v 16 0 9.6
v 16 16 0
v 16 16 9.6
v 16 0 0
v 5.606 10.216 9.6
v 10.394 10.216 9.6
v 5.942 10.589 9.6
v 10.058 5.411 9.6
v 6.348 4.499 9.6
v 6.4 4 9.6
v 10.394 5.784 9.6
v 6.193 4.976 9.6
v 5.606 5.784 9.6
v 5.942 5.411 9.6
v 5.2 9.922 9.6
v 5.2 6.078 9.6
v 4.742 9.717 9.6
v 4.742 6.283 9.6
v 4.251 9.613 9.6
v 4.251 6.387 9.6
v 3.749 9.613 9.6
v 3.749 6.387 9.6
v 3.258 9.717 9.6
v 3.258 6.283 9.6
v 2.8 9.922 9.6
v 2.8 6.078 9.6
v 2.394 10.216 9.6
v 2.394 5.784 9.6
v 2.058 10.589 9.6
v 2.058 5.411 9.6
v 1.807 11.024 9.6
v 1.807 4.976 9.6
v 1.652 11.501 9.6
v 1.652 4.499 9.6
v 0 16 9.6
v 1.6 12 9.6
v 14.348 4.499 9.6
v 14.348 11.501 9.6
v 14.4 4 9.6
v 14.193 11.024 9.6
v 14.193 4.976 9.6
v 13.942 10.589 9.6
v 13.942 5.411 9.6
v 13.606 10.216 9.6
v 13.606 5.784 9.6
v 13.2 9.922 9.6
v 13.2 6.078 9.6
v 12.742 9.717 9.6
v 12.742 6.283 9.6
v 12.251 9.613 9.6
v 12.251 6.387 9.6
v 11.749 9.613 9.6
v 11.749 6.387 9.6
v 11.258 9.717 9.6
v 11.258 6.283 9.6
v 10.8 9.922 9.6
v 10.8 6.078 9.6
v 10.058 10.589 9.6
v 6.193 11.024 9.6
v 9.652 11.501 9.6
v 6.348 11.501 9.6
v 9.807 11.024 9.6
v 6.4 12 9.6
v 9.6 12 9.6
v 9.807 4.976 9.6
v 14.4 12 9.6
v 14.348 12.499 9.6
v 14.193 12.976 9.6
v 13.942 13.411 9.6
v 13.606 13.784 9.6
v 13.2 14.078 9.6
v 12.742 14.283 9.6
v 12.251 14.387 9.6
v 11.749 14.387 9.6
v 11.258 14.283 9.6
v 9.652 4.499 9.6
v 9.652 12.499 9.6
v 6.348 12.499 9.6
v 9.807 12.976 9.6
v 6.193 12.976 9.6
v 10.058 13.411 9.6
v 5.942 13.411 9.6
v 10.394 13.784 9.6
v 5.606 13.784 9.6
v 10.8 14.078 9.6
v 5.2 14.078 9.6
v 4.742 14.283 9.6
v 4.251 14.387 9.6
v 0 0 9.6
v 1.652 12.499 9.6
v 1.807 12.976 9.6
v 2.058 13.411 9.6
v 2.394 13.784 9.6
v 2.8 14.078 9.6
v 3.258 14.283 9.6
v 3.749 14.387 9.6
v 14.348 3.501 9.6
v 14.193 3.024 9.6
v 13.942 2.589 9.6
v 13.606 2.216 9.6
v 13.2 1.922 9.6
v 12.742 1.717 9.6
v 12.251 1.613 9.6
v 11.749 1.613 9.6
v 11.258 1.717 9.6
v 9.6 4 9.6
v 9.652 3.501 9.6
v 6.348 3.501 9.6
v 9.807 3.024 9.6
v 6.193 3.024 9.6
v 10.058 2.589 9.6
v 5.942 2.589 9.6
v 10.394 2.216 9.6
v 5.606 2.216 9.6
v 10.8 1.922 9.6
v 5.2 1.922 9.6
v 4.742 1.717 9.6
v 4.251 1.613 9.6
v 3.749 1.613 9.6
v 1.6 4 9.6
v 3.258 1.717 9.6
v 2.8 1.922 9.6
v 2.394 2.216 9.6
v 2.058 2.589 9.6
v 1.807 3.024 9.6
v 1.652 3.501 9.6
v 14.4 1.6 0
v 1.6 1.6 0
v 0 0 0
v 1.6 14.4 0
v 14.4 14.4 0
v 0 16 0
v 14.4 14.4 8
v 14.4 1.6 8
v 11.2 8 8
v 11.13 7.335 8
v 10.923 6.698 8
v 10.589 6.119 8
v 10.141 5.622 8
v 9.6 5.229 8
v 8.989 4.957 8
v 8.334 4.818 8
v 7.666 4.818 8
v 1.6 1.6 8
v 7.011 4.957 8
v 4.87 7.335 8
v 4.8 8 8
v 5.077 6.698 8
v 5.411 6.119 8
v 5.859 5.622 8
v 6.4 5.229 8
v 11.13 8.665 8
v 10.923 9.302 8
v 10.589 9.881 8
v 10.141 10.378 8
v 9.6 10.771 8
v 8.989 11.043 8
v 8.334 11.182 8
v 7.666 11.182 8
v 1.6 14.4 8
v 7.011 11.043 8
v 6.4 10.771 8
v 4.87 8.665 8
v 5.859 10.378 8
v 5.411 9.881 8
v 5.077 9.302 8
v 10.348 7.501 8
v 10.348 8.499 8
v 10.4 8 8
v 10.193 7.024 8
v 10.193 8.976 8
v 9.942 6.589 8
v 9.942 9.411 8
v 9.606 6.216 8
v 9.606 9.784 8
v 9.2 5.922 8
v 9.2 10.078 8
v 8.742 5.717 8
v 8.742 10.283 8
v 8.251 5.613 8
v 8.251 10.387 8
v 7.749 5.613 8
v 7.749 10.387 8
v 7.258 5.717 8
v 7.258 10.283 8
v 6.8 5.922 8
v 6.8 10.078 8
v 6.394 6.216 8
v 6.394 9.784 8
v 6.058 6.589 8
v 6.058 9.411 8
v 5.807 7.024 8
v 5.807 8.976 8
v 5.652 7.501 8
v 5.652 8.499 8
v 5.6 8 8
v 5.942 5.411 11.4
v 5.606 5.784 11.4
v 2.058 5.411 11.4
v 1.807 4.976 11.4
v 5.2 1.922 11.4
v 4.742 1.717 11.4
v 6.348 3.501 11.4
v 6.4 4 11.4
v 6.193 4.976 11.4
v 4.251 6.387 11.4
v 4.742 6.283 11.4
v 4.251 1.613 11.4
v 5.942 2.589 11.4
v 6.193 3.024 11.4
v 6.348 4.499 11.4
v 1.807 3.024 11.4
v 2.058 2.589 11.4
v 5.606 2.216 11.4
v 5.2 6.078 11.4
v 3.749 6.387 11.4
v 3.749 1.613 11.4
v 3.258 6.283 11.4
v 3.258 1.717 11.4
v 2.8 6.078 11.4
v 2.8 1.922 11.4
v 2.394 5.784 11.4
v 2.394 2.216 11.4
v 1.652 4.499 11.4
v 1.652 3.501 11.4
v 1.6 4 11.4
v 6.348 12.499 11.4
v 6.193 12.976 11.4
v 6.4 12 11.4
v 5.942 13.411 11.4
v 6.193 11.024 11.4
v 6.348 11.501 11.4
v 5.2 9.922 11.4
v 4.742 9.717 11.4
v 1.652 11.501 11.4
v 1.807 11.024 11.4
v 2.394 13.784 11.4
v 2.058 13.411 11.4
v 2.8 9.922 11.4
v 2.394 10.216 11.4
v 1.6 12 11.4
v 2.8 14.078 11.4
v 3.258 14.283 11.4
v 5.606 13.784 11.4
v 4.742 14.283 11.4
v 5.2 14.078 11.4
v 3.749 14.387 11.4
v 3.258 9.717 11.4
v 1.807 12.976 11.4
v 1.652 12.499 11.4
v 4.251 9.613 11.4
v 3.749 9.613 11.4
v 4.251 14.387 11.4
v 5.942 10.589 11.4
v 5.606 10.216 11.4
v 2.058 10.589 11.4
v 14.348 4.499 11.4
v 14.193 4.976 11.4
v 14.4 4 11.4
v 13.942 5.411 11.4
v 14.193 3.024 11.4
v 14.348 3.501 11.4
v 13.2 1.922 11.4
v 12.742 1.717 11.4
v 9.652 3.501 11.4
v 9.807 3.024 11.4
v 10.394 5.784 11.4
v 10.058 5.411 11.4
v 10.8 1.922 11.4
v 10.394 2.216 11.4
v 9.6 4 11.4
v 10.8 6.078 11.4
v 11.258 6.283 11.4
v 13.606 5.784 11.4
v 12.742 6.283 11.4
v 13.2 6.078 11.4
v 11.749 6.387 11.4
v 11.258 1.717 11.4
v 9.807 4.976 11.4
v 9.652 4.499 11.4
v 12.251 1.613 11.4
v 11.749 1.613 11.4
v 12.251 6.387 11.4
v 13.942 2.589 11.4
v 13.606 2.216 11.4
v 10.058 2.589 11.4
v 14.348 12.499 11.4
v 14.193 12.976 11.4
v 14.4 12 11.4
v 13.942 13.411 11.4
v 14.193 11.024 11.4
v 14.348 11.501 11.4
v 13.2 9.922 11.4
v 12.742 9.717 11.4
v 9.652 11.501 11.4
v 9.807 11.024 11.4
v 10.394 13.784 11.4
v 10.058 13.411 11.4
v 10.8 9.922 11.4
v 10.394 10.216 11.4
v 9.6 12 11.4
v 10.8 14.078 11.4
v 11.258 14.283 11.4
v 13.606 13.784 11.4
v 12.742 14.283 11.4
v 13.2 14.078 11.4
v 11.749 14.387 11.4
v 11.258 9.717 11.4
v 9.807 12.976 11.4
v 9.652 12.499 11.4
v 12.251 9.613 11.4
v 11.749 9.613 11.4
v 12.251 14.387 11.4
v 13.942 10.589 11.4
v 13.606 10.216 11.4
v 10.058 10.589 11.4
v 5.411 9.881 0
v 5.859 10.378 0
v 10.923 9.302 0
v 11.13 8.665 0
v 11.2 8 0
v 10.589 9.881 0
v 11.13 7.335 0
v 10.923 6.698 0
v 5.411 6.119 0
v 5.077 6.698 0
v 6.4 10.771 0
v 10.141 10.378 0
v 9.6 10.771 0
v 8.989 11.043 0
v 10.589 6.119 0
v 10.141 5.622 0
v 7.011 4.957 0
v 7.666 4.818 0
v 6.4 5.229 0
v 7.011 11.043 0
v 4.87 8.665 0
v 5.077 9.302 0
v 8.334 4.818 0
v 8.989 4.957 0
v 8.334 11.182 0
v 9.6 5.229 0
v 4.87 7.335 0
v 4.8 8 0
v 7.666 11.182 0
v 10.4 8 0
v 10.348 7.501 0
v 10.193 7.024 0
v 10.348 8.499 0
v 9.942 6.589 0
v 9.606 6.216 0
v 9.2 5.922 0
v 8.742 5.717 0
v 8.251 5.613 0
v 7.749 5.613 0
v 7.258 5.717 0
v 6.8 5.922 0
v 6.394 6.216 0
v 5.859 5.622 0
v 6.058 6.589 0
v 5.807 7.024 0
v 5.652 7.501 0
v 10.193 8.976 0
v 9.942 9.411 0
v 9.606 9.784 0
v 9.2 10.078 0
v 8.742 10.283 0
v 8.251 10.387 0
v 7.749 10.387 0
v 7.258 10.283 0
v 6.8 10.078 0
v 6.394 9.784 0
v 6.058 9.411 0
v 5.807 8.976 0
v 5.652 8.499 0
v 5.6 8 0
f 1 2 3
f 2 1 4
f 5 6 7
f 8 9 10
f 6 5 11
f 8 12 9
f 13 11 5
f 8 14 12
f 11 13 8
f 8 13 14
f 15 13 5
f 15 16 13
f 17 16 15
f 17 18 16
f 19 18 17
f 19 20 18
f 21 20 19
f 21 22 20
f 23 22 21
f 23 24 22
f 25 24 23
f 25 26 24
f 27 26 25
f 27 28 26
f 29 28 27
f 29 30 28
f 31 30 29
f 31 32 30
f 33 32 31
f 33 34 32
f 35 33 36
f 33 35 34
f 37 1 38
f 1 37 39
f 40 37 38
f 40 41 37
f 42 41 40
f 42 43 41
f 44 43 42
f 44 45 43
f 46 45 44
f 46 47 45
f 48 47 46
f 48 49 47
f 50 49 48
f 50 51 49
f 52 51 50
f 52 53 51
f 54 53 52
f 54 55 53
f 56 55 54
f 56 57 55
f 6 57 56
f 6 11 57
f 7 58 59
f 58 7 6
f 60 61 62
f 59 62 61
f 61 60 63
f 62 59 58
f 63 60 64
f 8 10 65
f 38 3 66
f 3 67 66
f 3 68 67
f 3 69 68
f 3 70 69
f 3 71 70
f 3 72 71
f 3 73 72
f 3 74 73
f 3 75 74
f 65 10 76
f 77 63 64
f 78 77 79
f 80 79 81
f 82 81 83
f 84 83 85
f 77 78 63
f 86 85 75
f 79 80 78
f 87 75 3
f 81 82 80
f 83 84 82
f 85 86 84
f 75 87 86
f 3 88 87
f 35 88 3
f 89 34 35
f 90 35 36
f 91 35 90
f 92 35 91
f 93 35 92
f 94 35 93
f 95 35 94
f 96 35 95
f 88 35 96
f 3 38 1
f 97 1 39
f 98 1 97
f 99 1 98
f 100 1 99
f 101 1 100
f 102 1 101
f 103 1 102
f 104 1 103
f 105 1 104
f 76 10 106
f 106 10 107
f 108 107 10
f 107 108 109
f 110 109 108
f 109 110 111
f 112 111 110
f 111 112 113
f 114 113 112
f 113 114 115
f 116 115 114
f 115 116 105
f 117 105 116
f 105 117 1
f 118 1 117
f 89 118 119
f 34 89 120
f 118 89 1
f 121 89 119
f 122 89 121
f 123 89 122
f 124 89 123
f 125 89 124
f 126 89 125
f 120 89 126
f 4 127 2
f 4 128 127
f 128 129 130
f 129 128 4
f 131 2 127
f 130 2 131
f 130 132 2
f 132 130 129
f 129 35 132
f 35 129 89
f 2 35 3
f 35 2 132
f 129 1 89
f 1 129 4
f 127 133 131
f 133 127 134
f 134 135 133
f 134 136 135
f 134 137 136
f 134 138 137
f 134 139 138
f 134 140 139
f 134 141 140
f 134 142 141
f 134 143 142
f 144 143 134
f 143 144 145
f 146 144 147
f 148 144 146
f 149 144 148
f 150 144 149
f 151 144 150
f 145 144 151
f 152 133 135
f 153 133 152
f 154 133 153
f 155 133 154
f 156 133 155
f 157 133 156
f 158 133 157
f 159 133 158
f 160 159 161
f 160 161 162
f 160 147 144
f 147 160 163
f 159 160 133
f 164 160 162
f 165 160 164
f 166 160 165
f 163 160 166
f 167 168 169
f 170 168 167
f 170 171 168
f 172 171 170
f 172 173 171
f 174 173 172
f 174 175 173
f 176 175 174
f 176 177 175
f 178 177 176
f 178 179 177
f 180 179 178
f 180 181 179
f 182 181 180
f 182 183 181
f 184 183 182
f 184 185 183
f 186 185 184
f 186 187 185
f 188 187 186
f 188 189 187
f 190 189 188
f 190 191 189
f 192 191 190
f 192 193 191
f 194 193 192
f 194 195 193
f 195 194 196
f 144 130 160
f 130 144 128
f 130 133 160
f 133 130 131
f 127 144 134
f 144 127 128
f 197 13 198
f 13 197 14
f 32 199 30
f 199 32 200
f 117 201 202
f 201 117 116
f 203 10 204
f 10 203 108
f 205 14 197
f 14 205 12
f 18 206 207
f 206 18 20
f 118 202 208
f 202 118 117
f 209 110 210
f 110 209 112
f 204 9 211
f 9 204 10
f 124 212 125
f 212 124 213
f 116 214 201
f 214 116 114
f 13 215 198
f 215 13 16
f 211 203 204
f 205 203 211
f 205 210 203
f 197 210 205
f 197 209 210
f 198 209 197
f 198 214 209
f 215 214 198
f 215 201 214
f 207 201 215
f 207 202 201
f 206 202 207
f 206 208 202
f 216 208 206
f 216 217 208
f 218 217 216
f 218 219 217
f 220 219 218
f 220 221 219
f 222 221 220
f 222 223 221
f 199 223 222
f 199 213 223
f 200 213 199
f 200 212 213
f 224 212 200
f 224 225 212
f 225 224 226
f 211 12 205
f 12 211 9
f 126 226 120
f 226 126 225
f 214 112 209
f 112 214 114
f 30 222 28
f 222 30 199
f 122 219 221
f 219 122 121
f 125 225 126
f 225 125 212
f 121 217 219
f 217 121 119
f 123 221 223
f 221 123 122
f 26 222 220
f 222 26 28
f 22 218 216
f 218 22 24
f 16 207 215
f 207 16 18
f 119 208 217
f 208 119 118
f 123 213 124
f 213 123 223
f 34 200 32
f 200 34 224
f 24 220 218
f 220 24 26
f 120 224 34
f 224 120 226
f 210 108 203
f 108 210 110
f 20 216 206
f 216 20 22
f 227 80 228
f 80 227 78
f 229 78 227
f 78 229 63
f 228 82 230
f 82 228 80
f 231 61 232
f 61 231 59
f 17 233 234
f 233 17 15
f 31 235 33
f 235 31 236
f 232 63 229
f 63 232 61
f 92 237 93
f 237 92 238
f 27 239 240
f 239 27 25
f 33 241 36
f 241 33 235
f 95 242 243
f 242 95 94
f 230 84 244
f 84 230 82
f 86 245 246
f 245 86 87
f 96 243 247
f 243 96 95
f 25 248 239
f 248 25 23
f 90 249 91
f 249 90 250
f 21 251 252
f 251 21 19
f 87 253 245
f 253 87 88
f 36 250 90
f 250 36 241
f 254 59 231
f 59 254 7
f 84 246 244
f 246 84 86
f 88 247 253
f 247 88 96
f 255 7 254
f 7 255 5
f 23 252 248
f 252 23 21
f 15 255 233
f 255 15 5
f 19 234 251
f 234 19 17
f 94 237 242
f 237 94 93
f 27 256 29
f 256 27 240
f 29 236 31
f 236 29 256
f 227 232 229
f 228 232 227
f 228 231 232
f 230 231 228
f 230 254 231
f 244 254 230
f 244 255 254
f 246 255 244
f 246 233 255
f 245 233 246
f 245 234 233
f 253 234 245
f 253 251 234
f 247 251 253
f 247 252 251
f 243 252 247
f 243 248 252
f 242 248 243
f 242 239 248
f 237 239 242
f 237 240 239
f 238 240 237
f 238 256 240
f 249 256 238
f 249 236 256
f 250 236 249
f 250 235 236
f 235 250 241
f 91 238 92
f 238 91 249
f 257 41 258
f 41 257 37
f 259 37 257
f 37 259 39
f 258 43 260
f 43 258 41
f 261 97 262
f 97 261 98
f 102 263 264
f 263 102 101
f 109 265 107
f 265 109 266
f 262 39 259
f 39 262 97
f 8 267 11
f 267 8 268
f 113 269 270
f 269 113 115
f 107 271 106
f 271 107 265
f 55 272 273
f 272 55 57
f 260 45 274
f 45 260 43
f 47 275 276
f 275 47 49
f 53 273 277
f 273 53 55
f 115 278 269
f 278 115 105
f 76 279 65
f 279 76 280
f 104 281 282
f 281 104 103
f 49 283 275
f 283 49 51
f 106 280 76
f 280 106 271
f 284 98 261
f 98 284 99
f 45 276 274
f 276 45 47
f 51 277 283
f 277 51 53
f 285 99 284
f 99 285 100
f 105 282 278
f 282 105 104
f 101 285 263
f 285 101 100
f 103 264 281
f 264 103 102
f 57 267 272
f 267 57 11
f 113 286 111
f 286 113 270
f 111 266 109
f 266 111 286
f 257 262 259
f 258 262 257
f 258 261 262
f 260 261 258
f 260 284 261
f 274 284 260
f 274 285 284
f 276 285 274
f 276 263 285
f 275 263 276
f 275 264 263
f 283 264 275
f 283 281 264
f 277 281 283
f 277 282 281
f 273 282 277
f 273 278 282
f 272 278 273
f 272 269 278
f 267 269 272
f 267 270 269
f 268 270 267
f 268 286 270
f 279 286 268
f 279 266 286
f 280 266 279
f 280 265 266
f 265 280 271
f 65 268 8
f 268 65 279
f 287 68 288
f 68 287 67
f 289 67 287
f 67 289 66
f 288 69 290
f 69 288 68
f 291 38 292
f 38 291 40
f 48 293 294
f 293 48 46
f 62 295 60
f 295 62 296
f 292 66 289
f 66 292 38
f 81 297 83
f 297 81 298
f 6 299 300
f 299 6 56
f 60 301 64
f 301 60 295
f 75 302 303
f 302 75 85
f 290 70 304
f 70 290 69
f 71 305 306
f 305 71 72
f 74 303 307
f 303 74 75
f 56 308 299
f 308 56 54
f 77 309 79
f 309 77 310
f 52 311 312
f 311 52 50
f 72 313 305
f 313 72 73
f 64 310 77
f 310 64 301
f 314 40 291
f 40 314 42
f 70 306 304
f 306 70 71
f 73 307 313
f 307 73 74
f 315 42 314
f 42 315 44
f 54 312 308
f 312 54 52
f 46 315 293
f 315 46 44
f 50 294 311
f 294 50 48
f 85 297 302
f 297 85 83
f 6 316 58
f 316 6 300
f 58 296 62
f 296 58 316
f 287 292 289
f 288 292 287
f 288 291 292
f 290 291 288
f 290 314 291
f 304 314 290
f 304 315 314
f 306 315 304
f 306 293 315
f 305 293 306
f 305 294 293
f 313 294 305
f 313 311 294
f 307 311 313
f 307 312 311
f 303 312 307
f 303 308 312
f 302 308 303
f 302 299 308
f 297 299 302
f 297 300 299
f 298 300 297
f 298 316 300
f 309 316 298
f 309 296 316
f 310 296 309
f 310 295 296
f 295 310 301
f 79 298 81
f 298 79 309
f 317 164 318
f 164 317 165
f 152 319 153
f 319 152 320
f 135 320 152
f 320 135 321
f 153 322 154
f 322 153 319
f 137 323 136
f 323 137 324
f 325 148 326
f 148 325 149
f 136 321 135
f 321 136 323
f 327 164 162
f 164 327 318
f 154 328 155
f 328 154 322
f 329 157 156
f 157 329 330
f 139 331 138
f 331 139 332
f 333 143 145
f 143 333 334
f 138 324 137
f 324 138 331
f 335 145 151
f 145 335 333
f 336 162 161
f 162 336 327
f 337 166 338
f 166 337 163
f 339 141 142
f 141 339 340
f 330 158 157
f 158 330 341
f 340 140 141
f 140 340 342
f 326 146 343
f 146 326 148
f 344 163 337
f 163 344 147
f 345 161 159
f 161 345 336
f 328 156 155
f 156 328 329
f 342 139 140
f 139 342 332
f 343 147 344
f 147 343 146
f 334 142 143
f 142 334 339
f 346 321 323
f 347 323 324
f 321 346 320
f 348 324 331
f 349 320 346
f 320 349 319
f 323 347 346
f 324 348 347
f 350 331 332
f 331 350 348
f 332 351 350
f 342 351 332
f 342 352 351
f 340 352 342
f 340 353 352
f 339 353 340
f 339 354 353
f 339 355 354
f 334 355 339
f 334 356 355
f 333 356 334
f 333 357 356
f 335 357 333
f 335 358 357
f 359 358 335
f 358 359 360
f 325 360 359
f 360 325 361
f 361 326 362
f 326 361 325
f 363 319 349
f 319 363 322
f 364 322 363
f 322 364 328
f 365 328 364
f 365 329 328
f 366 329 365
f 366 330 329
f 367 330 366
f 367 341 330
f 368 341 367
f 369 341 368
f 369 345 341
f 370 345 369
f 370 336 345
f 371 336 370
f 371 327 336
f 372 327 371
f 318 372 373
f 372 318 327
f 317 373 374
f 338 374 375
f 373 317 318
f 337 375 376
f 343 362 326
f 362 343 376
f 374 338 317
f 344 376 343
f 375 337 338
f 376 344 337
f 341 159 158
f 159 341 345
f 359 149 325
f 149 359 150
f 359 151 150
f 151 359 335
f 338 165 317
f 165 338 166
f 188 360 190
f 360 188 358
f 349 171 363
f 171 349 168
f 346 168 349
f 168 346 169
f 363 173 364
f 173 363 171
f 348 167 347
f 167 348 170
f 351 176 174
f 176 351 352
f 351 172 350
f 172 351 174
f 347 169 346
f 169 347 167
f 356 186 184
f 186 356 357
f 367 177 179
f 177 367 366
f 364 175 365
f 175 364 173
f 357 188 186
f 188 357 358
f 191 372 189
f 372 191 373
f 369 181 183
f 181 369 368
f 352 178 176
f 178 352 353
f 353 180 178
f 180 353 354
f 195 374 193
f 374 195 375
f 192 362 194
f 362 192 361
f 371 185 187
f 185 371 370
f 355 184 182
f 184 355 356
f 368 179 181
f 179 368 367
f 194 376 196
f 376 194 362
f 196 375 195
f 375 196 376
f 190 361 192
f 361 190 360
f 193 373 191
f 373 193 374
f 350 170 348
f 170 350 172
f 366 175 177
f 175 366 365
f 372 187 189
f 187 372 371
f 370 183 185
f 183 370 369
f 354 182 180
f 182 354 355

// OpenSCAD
// Quick-and-dirty parametric LEGO-compatible
// bricks in OpenSCAD.
// LEGO(R) is a trademark of the LEGO Group.
// References:
// * http://www.robertcailliau.eu/Lego/Dimensions/zMeasurements-en.xhtml
// * http://nicjasno.com/forum/viewtopic.php?t=653

// Create (w*2,h*2) LEGO-compatible blocks.
two_by_two(1,1);

module two_by_two(w,l){
  // size constants
  DETAIL_SCALE=0.1; // all measurements below are in units of "0.1mm"
  WALL_THICKNESS=16; // 1.6mm thick walls - obviates need for tiny inner wall towers
  SQUARE_WIDTH=80; // 8mm
  SQUARE_HEIGHT=96; // 9.6mm - std. LEGO height
  PLATE_HEIGHT=32 * 3; // 3.2mm - std. flat plate height
  PEG_RADIUS=24; // 2.4mm
  PEG_HEIGHT=18; // 1.8mm
  ANTI_PEG_RADIUS=32; // 3.2mm

  my_height = PLATE_HEIGHT; // PLATE_HEIGHT or SQUARE_HEIGHT. DECIDE!

  scale(DETAIL_SCALE){
    // main outer rectangle shell
    difference(){
      cube([w*(SQUARE_WIDTH*2),l*(SQUARE_WIDTH*2),my_height]);
      translate([WALL_THICKNESS,WALL_THICKNESS,-WALL_THICKNESS]){
        cube([w*(2*SQUARE_WIDTH) - (2*WALL_THICKNESS), l*(2*SQUARE_WIDTH) - (2*WALL_THICKNESS), my_height]);
      }
    }

    // create 2x2 peg grid for each block "wide"x"long"
    for(i=[0:w-1]){ // for each 2x block wide
      for(j=[0:l-1]){ // for each 2x block long
        for(x=[SQUARE_WIDTH*0.5,SQUARE_WIDTH*1.5]) {
          for(y=[SQUARE_WIDTH*0.5, SQUARE_WIDTH*1.5]) {
            translate([(i * SQUARE_WIDTH * 2) + x, (j * SQUARE_WIDTH * 2) + y,my_height]){
            //  difference(){
                cylinder(h=PEG_HEIGHT, r=PEG_RADIUS);
			//	 cylinder(h=PEG_HEIGHT+0.1, r=(PEG_RADIUS - WALL_THICKNESS/2));
            //  }
            }
          }
        }
      }
    }

    // create 1x1 anti-peg grid for each block ((wide-1)*2)x(long-1)*2))
    for(i=[0:(w-1)*2]){
      for(j=[0:(l-1)*2]){
        translate([SQUARE_WIDTH + (SQUARE_WIDTH * i), SQUARE_WIDTH + (SQUARE_WIDTH * j), 0]){
          difference(){
            cylinder(r=ANTI_PEG_RADIUS, h=my_height);
            translate([0,0,-1]){
              cylinder(r=(ANTI_PEG_RADIUS - (WALL_THICKNESS/2)), h=my_height+0.5);
            }
          }
        }
      }
    }
  }
}
